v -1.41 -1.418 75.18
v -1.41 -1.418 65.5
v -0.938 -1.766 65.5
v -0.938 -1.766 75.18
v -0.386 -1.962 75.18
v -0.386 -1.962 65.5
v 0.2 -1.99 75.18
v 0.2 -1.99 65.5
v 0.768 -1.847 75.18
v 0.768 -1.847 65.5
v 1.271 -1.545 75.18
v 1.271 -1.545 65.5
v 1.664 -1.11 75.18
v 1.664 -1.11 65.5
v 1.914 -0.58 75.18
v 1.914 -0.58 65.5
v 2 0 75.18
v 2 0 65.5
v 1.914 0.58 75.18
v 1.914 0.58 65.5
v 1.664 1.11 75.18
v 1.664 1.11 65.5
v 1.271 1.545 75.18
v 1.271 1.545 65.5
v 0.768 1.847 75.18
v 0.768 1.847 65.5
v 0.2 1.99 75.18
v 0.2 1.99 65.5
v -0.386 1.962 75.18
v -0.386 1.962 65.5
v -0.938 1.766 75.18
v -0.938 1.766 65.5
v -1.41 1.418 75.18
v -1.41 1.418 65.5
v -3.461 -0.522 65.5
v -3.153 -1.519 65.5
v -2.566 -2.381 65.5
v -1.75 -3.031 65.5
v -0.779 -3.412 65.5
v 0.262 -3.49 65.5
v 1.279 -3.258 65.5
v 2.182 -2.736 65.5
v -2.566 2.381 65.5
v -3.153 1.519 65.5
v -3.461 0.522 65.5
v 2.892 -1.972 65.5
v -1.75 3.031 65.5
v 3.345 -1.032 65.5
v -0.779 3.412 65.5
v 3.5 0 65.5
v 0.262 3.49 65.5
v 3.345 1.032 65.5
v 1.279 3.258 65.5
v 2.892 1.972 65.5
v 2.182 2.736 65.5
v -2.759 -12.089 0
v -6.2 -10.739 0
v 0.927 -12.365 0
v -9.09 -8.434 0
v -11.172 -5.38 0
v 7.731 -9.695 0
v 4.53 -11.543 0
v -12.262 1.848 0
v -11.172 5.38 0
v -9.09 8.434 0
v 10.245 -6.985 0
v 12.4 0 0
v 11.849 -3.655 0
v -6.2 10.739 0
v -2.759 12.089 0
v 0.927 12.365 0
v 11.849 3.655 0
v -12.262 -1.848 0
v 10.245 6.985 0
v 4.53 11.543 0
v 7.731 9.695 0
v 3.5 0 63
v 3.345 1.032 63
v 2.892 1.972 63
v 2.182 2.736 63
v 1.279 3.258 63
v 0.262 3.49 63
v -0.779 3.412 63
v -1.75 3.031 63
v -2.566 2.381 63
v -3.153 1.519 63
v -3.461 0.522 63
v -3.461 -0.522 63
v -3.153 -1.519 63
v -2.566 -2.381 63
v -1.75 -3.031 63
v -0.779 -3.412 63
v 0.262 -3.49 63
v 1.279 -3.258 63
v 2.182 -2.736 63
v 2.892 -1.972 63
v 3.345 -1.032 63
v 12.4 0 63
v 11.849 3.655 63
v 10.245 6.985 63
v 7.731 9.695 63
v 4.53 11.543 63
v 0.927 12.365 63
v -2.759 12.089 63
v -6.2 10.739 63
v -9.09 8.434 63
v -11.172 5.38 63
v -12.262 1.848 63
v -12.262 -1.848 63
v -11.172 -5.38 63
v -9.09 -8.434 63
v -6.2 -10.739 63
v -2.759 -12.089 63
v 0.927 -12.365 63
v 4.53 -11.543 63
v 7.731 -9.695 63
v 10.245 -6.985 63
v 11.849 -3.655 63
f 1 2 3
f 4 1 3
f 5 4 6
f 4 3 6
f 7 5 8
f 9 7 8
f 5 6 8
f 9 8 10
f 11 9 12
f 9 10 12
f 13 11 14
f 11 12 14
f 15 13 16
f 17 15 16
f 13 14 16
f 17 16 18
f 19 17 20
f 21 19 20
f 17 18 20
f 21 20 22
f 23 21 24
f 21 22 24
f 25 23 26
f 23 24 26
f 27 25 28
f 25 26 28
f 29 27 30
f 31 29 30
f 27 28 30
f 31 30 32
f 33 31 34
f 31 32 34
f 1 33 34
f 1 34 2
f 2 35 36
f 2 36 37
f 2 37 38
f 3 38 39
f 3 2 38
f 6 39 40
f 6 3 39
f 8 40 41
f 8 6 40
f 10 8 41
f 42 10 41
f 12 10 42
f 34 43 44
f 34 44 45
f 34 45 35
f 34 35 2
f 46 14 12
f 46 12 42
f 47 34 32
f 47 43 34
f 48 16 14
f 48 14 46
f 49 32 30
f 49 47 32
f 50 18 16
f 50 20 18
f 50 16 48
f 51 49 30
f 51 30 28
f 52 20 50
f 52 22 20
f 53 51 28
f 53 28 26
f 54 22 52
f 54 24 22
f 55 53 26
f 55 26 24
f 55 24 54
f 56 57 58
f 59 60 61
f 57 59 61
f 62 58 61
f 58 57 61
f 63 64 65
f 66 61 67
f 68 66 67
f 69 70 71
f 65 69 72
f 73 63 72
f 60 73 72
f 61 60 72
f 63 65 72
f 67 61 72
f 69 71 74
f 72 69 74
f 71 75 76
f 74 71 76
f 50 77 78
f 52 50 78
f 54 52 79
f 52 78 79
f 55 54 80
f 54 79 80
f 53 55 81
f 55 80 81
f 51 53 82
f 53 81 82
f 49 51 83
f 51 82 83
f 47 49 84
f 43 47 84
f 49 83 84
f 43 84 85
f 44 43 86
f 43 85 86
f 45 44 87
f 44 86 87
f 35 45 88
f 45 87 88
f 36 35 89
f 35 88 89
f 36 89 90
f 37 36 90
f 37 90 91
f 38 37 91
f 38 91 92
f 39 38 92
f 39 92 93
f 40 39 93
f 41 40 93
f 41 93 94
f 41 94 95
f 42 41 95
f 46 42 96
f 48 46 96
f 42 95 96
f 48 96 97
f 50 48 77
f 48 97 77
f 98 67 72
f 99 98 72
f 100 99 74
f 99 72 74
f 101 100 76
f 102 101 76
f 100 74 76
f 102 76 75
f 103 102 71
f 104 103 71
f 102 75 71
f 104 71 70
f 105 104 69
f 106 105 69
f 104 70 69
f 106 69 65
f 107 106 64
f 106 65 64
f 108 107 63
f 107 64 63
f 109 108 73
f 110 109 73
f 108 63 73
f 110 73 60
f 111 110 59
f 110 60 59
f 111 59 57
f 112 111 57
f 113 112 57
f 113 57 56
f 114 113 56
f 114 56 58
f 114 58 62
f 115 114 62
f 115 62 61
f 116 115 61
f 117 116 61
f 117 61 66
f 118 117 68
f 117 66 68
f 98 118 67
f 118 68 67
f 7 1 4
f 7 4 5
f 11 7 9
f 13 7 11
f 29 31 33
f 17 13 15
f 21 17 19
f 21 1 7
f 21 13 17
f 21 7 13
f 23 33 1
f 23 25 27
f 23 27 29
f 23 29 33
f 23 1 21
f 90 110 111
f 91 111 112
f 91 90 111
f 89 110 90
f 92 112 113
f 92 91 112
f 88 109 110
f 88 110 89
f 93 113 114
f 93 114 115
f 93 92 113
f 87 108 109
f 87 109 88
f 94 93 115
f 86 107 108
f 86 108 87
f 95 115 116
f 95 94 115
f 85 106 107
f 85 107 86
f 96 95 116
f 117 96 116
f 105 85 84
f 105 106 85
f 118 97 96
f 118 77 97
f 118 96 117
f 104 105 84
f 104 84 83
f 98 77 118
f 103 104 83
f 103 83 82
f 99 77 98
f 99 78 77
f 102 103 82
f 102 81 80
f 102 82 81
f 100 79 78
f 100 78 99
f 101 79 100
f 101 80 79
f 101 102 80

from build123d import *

# Parameters (mm, degrees)
SKETCH_1_R      = 12.4
EXTRUDE_1_DEPTH = 63
SKETCH_2_R      = 3.5
EXTRUDE_2_DEPTH = 2.5
EXTRUDE_3_DEPTH = 9.68


with BuildPart() as part:
    # 草图1 → 凸台-拉伸1 (new body)
    with BuildSketch(Plane.XY):
        Circle(SKETCH_1_R)
    extrude(amount=EXTRUDE_1_DEPTH)

    # 草图2 → 凸台-拉伸2 (add)
    with BuildSketch(Plane.XY.offset(63)):
        Circle(SKETCH_2_R)
    extrude(amount=EXTRUDE_2_DEPTH)

    # 草图3 → 凸台-拉伸3 (add)
    with BuildSketch(Plane.XY.offset(65.5)):
        with BuildLine():
            Line((-1.41, 1.418414608), (-1.41, -1.418414608))
            ThreePointArc((-1.41, -1.418414608), (2, 0), (-1.41, 1.418414608))
        make_face()
    extrude(amount=EXTRUDE_3_DEPTH)


solid = part.part
